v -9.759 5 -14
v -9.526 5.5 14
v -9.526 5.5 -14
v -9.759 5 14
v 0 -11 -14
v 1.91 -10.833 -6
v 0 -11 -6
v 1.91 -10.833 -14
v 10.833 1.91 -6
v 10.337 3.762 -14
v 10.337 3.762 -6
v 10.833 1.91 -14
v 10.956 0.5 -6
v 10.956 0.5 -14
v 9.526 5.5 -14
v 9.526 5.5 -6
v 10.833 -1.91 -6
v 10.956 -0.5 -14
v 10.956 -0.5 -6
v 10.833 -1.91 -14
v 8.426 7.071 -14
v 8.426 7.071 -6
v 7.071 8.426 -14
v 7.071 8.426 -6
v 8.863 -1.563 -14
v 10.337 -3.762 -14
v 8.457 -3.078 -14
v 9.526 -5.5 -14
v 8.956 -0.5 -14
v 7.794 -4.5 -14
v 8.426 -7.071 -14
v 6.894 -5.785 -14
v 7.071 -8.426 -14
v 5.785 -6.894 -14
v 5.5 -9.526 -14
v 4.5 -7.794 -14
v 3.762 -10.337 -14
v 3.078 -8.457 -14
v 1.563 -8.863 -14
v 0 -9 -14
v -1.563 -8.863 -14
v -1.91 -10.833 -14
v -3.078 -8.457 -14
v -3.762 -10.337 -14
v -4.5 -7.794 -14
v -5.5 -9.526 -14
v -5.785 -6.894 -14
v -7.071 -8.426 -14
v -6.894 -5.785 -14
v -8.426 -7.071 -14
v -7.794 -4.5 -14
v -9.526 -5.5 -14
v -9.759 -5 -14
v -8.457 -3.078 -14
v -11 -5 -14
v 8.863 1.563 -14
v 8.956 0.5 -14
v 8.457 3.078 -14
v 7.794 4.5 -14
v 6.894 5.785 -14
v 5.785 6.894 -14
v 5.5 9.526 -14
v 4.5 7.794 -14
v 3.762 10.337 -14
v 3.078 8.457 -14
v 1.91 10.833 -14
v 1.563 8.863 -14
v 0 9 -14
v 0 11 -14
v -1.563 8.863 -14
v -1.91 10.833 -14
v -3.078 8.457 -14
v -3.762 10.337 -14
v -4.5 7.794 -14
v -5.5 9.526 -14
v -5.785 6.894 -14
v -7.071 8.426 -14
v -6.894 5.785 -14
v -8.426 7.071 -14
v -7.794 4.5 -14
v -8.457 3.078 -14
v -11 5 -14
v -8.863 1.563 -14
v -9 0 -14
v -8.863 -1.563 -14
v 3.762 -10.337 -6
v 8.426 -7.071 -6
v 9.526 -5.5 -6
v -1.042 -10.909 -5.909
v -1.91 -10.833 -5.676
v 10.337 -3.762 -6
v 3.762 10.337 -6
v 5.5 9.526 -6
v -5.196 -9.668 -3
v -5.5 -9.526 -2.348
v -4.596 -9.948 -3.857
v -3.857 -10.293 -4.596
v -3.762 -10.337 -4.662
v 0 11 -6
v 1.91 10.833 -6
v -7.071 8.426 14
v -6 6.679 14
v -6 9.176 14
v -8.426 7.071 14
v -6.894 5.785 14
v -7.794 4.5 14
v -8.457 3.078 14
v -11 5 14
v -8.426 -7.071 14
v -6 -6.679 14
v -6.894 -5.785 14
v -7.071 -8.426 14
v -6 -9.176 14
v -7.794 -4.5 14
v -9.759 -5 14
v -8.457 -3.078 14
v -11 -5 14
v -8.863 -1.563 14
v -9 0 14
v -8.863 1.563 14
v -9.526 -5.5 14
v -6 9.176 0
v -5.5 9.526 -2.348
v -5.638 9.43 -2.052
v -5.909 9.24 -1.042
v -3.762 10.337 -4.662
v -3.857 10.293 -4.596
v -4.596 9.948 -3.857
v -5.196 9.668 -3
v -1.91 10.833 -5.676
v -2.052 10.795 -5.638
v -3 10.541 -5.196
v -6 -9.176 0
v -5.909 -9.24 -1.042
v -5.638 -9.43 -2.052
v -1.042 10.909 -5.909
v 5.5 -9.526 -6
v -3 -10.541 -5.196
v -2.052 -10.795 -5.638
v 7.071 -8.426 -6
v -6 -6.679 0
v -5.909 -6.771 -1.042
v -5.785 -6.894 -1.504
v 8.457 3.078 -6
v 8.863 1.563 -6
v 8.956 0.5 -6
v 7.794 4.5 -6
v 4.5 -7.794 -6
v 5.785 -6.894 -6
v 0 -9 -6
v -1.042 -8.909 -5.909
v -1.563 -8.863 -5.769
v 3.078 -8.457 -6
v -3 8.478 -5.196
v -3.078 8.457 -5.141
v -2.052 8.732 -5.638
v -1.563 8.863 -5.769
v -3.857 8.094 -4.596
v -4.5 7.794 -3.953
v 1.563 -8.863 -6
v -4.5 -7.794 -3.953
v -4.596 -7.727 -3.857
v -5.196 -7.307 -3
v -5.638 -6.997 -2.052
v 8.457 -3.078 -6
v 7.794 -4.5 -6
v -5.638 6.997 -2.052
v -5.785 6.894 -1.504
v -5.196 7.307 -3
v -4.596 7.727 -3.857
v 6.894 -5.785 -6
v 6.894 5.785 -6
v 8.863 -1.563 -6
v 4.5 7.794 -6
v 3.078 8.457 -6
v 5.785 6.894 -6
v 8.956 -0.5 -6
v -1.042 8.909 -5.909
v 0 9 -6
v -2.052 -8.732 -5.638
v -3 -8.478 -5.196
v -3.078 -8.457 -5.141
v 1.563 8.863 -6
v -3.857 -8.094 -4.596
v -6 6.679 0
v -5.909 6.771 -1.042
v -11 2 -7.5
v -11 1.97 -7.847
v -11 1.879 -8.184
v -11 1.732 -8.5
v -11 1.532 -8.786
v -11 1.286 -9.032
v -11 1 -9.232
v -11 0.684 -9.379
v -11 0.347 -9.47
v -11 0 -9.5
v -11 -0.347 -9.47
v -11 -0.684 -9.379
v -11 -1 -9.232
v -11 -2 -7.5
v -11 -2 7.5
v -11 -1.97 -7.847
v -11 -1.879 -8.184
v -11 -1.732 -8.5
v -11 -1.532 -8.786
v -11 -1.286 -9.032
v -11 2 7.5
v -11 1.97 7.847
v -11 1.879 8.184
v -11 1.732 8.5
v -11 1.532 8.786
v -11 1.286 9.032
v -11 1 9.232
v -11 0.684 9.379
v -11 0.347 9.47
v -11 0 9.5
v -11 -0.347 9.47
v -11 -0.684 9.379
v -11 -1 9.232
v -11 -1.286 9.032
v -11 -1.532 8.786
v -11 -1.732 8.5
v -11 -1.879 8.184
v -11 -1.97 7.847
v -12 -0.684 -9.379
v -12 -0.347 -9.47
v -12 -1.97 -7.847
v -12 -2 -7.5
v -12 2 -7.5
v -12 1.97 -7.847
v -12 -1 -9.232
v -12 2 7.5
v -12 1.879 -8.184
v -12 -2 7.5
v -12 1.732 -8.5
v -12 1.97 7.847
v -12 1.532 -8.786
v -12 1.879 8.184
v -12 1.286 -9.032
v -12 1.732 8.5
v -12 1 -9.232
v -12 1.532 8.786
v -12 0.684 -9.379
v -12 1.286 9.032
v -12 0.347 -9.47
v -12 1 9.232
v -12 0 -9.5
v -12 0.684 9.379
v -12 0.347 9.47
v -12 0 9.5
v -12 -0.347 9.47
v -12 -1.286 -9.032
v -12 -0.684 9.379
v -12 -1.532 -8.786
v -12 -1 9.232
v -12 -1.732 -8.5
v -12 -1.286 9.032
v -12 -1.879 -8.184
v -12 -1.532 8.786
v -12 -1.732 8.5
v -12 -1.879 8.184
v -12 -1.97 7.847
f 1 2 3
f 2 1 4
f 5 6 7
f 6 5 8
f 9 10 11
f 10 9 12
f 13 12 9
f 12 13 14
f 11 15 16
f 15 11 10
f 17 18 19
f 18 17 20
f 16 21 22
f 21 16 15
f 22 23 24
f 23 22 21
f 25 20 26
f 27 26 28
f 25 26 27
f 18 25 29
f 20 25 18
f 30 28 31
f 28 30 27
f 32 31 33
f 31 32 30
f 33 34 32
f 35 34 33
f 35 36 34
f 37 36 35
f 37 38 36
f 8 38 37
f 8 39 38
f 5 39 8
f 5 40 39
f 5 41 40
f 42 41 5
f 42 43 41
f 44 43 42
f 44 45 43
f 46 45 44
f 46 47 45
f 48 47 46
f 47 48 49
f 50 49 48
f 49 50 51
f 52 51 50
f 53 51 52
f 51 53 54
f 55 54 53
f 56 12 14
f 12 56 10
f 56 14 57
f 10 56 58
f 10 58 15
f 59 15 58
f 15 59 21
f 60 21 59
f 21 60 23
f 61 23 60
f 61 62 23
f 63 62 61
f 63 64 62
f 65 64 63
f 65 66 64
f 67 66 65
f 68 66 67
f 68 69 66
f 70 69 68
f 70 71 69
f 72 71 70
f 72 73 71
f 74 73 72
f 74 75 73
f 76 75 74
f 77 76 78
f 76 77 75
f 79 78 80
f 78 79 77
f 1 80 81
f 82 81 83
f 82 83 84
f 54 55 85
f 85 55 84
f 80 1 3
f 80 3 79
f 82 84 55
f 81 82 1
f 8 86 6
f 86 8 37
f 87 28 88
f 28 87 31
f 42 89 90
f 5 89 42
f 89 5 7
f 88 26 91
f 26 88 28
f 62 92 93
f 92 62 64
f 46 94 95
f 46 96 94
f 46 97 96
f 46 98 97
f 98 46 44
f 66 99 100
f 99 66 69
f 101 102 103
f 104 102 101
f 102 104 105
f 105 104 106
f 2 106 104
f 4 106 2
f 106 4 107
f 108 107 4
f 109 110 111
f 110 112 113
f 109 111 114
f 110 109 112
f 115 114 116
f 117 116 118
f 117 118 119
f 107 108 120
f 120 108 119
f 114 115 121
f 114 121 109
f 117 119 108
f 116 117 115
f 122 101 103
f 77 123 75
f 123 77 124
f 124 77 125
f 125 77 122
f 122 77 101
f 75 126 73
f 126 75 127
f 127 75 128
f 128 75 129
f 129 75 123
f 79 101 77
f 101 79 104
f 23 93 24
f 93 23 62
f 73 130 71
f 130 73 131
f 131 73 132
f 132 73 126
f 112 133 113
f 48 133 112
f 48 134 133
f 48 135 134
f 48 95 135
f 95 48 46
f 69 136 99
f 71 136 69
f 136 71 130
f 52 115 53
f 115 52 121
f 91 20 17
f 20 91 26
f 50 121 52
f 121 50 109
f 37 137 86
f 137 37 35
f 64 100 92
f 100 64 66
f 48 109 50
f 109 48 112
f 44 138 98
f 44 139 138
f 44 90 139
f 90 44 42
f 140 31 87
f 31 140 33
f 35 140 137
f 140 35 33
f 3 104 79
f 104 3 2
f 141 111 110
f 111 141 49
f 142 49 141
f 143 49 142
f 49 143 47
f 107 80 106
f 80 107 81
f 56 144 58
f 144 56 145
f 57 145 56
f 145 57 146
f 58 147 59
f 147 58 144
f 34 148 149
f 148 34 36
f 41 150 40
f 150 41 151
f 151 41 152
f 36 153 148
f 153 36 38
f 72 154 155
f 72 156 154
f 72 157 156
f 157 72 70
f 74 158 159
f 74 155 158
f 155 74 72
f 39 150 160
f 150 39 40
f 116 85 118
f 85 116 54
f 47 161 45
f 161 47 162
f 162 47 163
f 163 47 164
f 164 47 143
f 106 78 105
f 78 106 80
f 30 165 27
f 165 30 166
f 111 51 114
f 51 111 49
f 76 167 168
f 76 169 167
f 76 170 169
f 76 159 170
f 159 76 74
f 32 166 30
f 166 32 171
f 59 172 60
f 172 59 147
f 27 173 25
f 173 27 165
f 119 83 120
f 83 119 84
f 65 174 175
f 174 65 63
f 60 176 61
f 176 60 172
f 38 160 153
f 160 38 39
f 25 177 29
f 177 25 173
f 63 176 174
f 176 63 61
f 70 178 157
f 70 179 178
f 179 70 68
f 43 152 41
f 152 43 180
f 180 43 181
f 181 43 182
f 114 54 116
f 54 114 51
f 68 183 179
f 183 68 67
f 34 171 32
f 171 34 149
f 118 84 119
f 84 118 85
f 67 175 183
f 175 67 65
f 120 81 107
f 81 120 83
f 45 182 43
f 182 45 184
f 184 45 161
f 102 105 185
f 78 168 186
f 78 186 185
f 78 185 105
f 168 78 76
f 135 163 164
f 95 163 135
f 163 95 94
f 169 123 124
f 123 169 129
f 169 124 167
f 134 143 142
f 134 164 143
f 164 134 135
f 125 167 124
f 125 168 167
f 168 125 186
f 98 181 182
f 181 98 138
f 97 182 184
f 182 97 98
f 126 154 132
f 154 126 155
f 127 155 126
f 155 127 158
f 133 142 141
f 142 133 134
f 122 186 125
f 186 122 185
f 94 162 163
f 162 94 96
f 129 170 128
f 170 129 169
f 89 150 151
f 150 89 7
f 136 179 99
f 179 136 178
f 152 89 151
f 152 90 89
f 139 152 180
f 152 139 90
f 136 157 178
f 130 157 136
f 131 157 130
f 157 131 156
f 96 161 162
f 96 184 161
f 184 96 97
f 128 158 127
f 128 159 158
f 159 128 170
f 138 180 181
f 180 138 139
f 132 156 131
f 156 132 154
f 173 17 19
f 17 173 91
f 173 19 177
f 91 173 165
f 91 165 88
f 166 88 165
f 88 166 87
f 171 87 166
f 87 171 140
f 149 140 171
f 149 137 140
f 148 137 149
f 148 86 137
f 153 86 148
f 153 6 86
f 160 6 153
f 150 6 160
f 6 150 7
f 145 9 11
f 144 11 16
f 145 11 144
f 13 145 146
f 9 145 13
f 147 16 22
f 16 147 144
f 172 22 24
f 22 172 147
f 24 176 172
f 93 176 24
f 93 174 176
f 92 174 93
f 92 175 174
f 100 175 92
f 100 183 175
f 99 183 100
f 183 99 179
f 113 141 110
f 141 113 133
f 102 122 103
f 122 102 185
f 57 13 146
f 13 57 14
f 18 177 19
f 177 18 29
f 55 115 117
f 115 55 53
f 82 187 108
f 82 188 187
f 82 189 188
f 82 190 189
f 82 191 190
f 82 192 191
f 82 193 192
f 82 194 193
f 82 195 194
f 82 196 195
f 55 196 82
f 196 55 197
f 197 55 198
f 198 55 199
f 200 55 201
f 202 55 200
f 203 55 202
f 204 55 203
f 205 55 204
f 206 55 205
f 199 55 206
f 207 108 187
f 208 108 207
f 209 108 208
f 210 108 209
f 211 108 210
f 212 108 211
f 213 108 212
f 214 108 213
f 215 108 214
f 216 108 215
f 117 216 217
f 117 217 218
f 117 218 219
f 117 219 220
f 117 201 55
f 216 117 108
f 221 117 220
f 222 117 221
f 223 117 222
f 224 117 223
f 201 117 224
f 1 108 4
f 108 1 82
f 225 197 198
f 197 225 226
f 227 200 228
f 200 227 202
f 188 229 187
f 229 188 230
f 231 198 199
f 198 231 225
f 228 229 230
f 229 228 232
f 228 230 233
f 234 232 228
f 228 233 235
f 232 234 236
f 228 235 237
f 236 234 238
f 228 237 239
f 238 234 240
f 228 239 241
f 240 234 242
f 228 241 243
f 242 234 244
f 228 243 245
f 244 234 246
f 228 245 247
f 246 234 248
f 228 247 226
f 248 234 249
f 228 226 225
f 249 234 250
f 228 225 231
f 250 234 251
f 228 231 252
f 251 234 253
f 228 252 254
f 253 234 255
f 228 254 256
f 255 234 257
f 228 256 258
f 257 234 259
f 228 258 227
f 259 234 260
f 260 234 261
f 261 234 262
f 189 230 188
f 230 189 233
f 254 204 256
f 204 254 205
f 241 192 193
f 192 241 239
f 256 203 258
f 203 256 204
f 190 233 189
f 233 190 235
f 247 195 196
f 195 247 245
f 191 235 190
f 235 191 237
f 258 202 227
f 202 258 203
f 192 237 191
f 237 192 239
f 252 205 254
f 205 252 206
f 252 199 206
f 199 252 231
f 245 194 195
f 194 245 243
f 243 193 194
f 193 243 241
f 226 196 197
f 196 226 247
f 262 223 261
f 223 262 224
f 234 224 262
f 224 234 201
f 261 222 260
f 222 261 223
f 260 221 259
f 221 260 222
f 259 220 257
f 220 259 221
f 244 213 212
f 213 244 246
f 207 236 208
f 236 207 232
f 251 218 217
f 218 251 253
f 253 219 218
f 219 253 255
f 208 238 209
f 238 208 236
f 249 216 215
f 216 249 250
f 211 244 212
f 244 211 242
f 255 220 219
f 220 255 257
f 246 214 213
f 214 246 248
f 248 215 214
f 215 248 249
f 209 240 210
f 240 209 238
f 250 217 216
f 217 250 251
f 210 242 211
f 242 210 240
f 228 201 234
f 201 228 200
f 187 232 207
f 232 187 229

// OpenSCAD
diameter = 18;

$fn=36;
height = 28;
module plate (){
    translate([-5, 0, 0])         cube([10, height, 2]);
    translate([0, 6.5, 0])        cylinder(r=2, h=3);
    translate([0, height-6.5, 0]) cylinder(r=2, h=3);
    translate([-2, 6.5, 0])       cube([4, height-13, 3]);

}

module ring( ){
    difference(){
    cylinder(h= height, d=diameter +4, center=true);
    cylinder(h= height+2, d=diameter, center=true);
    rotate([90, 0, 0]) cylinder(h=diameter +6, d=12, center = true);
    translate([0, -(diameter+6)/2, -6]) cube([diameter, diameter +6, 12]);
    translate([-6, -(diameter+6)/2, 0]) cube([diameter, diameter +6, (height+4 )/2]);
    translate([0, -0.5, -(height/2)-1]) cube([diameter, 1, height+2]);
    }
}
ring();
translate([-(diameter/2), 0, -(height/2)]) rotate([90, 0, 270])plate();
